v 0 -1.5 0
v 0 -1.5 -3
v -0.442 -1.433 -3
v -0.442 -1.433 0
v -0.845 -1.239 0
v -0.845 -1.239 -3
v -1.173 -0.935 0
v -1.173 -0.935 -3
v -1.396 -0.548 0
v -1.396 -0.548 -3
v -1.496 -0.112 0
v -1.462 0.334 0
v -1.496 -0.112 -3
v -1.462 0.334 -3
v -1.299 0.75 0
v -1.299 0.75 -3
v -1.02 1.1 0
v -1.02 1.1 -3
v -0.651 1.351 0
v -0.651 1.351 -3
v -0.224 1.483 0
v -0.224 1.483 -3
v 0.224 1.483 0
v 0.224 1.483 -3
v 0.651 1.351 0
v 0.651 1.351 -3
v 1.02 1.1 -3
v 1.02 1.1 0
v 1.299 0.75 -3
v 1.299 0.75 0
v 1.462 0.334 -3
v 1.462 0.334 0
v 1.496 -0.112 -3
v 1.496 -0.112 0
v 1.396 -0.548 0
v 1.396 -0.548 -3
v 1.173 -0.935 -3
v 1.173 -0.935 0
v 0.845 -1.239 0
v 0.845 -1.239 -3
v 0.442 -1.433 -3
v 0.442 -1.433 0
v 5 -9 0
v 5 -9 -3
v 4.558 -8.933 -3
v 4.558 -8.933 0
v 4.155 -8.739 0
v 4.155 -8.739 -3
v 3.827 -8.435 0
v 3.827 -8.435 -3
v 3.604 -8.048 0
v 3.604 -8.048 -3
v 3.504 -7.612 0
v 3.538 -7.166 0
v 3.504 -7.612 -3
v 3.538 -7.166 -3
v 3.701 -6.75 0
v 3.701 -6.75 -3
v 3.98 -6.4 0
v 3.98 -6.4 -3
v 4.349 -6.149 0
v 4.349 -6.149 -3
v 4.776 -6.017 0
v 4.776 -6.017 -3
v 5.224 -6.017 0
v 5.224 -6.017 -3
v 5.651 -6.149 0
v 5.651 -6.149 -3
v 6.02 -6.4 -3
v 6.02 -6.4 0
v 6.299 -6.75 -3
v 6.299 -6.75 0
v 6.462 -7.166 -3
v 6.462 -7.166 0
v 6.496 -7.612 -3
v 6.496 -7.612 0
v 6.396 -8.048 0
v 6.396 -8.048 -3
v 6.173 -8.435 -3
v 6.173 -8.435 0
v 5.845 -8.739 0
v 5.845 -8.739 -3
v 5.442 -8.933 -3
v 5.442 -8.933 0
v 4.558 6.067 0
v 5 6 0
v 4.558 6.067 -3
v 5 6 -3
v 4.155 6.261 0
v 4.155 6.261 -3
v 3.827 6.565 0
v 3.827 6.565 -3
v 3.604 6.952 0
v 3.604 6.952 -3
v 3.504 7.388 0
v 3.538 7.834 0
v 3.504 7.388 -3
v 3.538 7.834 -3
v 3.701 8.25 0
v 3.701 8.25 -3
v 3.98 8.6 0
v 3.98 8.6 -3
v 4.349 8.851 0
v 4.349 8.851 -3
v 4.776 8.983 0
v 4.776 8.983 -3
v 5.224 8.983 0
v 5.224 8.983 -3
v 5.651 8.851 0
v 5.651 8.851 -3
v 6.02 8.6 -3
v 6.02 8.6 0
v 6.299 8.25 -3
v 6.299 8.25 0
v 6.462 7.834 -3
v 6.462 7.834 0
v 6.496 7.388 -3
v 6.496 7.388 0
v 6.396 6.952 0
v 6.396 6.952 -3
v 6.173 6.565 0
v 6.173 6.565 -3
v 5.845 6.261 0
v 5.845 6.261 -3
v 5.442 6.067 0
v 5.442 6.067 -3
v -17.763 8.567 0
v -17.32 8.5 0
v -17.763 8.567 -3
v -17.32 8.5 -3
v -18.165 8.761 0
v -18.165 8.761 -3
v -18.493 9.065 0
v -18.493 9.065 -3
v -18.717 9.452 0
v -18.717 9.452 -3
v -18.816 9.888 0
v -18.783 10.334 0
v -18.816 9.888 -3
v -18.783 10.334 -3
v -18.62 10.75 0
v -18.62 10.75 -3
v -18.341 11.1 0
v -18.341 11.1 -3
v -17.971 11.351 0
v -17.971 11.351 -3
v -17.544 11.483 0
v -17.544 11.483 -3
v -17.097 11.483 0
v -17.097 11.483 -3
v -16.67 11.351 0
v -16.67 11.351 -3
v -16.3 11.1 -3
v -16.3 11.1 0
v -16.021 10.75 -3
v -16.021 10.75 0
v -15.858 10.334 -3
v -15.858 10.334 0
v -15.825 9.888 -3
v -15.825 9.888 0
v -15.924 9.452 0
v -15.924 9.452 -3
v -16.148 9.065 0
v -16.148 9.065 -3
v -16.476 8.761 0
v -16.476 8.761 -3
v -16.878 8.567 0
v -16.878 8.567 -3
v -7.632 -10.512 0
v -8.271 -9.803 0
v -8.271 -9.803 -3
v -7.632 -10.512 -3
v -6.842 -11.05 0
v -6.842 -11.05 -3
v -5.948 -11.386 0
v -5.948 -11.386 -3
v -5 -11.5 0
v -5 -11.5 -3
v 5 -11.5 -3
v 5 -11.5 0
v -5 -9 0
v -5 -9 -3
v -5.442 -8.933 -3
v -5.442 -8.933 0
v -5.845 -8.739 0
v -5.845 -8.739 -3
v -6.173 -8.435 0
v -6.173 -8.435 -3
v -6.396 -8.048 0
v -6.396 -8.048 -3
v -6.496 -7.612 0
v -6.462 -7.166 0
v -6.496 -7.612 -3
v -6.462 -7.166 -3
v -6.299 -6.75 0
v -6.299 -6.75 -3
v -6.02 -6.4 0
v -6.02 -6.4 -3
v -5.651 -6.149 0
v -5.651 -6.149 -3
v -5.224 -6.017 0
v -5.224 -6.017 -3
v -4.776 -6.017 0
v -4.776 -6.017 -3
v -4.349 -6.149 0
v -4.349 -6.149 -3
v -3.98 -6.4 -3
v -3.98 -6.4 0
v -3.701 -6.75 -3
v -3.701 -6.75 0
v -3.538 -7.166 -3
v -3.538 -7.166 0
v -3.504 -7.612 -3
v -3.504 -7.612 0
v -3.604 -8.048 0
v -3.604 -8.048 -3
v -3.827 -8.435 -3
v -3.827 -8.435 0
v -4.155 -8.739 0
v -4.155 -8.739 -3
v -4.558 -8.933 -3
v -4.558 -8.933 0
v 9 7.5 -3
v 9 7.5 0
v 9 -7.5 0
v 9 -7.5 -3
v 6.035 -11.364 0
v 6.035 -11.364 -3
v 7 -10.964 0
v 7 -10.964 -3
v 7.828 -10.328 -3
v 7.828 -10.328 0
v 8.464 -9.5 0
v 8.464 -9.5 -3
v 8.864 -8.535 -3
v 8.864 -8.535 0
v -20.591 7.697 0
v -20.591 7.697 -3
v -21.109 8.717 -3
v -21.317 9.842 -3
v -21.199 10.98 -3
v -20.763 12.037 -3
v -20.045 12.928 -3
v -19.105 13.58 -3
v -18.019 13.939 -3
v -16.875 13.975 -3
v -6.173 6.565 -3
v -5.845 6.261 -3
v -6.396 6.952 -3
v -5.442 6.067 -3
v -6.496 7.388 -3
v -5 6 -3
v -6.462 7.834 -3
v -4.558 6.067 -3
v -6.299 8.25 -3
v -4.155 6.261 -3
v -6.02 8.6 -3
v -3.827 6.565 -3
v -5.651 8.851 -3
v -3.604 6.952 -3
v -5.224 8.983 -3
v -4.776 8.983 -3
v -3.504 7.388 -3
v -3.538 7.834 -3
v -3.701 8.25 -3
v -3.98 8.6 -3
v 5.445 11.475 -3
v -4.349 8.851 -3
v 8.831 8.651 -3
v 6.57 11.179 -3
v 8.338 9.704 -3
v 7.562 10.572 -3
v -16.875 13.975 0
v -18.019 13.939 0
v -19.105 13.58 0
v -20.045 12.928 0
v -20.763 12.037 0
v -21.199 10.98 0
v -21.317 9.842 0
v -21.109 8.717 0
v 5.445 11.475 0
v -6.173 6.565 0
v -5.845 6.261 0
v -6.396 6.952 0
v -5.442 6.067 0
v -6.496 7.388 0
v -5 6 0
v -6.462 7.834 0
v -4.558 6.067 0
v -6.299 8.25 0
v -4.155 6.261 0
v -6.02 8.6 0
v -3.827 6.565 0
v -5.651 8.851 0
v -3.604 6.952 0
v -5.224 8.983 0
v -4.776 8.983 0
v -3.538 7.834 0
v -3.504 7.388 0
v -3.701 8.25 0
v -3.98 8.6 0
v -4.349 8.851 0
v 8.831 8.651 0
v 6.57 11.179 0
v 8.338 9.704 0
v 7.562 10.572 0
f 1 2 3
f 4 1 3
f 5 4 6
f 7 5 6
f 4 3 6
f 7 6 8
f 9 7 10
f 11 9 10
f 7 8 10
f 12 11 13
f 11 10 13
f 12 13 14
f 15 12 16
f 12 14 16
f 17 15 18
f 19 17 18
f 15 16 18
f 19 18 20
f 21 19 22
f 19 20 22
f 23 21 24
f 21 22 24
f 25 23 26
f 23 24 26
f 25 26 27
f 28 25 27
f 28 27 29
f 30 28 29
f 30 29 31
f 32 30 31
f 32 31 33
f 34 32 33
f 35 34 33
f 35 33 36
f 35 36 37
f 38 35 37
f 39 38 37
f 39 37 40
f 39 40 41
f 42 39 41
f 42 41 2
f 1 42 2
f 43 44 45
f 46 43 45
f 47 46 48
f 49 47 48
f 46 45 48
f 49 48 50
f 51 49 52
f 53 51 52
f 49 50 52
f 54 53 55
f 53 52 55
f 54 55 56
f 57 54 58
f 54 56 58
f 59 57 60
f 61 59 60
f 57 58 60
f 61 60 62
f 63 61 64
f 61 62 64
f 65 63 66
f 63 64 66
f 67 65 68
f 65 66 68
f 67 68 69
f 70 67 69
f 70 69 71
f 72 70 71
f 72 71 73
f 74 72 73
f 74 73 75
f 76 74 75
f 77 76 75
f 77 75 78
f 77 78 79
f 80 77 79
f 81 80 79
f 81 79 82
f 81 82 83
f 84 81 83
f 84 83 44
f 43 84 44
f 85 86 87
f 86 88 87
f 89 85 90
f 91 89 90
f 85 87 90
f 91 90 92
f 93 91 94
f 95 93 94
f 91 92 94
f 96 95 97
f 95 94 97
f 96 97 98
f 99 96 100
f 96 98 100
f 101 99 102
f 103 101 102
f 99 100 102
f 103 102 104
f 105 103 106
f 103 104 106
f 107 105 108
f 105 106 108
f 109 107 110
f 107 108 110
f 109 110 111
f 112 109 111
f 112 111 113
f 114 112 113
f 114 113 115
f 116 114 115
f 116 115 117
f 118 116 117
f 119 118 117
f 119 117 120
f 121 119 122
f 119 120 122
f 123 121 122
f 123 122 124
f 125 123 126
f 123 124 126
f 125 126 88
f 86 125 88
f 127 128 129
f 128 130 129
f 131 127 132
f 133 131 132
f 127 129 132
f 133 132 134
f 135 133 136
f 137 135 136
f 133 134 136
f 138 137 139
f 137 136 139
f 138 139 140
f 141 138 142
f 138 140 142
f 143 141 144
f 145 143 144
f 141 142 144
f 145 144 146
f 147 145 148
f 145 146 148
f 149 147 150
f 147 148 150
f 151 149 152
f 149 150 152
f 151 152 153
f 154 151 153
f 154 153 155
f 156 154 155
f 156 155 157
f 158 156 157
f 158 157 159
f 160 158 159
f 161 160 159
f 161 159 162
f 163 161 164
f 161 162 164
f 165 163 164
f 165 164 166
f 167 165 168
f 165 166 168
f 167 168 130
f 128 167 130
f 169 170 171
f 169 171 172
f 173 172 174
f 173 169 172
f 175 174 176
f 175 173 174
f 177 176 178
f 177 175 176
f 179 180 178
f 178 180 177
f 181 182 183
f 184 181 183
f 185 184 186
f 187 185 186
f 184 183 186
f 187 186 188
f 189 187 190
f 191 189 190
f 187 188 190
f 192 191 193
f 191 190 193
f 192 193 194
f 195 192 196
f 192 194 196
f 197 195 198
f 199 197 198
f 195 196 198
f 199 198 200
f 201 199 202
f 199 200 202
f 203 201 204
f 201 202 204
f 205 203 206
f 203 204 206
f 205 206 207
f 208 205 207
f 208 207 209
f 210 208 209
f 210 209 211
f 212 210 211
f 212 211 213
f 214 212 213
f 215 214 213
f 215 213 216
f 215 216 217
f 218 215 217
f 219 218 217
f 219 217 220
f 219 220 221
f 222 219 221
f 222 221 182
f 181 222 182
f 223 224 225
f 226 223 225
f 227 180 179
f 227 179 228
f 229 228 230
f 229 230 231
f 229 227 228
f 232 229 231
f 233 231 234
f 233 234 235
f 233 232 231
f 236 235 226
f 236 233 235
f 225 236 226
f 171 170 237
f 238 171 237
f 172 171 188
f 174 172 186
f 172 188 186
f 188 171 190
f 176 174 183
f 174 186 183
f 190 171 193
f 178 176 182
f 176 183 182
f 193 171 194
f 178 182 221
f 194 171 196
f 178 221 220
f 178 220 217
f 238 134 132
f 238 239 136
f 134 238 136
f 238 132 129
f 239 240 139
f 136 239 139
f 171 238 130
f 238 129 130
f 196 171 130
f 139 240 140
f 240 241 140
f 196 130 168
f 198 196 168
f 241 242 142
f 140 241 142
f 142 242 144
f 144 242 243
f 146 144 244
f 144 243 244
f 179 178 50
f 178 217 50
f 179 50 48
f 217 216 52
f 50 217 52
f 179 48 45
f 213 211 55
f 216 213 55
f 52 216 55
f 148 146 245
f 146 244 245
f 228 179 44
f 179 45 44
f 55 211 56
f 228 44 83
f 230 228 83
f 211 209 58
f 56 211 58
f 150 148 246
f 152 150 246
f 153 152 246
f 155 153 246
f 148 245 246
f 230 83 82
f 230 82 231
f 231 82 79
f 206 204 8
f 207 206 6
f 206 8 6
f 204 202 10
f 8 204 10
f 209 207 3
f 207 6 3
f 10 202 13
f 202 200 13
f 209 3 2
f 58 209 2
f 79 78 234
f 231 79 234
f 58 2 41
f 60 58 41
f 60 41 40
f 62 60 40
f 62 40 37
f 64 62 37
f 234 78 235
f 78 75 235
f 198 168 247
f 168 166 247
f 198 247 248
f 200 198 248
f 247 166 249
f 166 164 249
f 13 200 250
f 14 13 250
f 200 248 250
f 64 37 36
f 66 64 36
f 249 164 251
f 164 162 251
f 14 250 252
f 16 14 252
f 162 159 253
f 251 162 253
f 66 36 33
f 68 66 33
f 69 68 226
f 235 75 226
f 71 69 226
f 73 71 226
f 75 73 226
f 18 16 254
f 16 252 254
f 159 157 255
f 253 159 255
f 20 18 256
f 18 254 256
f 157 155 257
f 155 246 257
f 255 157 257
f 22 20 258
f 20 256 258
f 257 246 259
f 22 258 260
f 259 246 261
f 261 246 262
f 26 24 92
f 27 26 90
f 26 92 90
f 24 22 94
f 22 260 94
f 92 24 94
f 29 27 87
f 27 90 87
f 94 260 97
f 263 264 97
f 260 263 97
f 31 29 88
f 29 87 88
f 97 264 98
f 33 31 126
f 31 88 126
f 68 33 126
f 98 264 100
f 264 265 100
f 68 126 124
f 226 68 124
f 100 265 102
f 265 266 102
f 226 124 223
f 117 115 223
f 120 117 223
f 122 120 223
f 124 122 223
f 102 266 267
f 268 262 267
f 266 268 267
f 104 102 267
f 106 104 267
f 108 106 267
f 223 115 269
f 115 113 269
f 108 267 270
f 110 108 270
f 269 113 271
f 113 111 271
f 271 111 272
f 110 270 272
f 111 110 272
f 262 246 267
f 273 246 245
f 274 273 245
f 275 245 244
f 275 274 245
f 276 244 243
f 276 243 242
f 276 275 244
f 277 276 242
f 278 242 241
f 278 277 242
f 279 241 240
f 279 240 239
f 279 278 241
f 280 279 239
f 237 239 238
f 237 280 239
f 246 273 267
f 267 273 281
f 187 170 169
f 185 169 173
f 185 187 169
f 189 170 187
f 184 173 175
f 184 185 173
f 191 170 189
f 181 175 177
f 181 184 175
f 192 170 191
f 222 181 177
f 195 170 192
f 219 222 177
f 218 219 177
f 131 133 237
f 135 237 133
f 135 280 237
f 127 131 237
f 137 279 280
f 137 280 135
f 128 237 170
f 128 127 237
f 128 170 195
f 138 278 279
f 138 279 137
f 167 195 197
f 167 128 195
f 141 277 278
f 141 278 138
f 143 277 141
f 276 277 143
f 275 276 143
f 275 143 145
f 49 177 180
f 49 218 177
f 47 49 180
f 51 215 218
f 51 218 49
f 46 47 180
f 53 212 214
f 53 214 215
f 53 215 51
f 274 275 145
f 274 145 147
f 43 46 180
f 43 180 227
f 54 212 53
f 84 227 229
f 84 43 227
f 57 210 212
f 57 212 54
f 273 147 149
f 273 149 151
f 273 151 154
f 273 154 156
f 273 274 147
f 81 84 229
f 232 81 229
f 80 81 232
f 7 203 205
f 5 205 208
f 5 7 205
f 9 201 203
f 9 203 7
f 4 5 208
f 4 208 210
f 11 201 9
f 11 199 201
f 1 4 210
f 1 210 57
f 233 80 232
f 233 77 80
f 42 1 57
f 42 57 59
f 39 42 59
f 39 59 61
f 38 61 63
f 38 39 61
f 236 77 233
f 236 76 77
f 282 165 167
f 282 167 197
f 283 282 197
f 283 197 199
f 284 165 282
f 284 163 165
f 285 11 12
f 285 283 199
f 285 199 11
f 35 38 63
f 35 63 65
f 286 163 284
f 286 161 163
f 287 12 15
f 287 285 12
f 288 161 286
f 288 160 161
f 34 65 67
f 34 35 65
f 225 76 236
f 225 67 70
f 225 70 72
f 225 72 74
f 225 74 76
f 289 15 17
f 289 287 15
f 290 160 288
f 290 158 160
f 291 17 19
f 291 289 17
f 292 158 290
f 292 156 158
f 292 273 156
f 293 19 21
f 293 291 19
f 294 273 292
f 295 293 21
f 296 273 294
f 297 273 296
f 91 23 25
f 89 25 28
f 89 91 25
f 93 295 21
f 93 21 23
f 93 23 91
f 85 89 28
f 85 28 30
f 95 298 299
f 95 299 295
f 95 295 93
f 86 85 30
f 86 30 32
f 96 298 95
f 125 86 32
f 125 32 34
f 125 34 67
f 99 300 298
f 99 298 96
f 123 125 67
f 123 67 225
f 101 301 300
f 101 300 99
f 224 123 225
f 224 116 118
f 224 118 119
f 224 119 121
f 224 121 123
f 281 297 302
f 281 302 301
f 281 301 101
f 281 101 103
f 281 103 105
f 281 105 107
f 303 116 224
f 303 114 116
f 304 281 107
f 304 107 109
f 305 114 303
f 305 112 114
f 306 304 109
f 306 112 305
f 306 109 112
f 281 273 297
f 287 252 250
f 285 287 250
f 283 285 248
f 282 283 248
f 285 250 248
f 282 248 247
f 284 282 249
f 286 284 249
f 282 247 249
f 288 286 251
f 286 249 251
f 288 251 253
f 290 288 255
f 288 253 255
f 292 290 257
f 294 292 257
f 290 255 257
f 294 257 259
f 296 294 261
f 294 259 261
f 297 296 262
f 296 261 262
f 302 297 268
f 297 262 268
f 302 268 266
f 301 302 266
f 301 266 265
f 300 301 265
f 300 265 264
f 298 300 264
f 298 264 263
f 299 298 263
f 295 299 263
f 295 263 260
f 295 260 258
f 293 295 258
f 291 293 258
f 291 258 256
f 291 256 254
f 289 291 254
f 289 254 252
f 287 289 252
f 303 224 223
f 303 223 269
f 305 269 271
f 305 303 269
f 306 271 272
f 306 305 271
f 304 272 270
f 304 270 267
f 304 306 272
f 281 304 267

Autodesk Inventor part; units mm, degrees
ref_plane "YZ Plane" through (0, 0, 0) normal (1, 0, 0) x (0, 1, 0)
ref_plane "XZ Plane" through (0, 0, 0) normal (0, 1, 0) x (-1, 0, 0)
ref_plane "XY Plane" through (0, 0, 0) normal (0, 0, 1) x (1, 0, 0)
sketch "Sketch1" plane through (0, 0, 0) normal (0, 0, 1) x (1, 0, 0)
  line L0 (0, 0) -> (-17.3205, 10) construction
  line L1 (5, -7.5) -> (-5, -7.5) construction
  line L2 (-5, -7.5) -> (-5, 7.5) construction
  line L3 (-5, 7.5) -> (5, 7.5) construction
  line L4 (5, 7.5) -> (5, -7.5) construction
  line L5 (5, -7.5) -> (-5, 7.5) construction
  line L6 (-5, -7.5) -> (5, 7.5) construction
  line L7 (-16.8753, 13.9751) -> (5.4452, 11.4751)
  arc A0 (9, 7.5) -> (5.4452, 11.4751) centre (5, 7.5) ccw
  line L8 (9, 7.5) -> (9, -7.5)
  arc A1 (5, -11.5) -> (9, -7.5) centre (5, -7.5) ccw
  line L9 (5, -11.5) -> (-5, -11.5)
  arc A2 (-8.2707, -9.8027) -> (-5, -11.5) centre (-5, -7.5) ccw
  line L10 (-8.2707, -9.8027) -> (-20.5912, 7.6973)
  arc A3 (-16.8753, 13.9751) -> (-20.5912, 7.6973) centre (-17.3205, 10) ccw
  dimension "d0" = 10
  dimension "d1" = 15
  dimension "d2" = 20
  dimension "d3" = 30
  dimension "d4" = 4
extrude "Extrusion1" add sketch "Sketch1" against normal blind 3
hole "Hole1" at (-17.3205, 10, 0) at (-5, 7.5, 0) at (5, 7.5, 0) at (5, -7.5, 0) at (-5, -7.5, 0) direction (0, 0, -1) diameter 3 depth 8 tip angle 118
hole "Hole2" at (0, 0, 0) direction (0, 0, -1) diameter 3 depth 8 tip angle 118
properties part number "LegBase_back"
